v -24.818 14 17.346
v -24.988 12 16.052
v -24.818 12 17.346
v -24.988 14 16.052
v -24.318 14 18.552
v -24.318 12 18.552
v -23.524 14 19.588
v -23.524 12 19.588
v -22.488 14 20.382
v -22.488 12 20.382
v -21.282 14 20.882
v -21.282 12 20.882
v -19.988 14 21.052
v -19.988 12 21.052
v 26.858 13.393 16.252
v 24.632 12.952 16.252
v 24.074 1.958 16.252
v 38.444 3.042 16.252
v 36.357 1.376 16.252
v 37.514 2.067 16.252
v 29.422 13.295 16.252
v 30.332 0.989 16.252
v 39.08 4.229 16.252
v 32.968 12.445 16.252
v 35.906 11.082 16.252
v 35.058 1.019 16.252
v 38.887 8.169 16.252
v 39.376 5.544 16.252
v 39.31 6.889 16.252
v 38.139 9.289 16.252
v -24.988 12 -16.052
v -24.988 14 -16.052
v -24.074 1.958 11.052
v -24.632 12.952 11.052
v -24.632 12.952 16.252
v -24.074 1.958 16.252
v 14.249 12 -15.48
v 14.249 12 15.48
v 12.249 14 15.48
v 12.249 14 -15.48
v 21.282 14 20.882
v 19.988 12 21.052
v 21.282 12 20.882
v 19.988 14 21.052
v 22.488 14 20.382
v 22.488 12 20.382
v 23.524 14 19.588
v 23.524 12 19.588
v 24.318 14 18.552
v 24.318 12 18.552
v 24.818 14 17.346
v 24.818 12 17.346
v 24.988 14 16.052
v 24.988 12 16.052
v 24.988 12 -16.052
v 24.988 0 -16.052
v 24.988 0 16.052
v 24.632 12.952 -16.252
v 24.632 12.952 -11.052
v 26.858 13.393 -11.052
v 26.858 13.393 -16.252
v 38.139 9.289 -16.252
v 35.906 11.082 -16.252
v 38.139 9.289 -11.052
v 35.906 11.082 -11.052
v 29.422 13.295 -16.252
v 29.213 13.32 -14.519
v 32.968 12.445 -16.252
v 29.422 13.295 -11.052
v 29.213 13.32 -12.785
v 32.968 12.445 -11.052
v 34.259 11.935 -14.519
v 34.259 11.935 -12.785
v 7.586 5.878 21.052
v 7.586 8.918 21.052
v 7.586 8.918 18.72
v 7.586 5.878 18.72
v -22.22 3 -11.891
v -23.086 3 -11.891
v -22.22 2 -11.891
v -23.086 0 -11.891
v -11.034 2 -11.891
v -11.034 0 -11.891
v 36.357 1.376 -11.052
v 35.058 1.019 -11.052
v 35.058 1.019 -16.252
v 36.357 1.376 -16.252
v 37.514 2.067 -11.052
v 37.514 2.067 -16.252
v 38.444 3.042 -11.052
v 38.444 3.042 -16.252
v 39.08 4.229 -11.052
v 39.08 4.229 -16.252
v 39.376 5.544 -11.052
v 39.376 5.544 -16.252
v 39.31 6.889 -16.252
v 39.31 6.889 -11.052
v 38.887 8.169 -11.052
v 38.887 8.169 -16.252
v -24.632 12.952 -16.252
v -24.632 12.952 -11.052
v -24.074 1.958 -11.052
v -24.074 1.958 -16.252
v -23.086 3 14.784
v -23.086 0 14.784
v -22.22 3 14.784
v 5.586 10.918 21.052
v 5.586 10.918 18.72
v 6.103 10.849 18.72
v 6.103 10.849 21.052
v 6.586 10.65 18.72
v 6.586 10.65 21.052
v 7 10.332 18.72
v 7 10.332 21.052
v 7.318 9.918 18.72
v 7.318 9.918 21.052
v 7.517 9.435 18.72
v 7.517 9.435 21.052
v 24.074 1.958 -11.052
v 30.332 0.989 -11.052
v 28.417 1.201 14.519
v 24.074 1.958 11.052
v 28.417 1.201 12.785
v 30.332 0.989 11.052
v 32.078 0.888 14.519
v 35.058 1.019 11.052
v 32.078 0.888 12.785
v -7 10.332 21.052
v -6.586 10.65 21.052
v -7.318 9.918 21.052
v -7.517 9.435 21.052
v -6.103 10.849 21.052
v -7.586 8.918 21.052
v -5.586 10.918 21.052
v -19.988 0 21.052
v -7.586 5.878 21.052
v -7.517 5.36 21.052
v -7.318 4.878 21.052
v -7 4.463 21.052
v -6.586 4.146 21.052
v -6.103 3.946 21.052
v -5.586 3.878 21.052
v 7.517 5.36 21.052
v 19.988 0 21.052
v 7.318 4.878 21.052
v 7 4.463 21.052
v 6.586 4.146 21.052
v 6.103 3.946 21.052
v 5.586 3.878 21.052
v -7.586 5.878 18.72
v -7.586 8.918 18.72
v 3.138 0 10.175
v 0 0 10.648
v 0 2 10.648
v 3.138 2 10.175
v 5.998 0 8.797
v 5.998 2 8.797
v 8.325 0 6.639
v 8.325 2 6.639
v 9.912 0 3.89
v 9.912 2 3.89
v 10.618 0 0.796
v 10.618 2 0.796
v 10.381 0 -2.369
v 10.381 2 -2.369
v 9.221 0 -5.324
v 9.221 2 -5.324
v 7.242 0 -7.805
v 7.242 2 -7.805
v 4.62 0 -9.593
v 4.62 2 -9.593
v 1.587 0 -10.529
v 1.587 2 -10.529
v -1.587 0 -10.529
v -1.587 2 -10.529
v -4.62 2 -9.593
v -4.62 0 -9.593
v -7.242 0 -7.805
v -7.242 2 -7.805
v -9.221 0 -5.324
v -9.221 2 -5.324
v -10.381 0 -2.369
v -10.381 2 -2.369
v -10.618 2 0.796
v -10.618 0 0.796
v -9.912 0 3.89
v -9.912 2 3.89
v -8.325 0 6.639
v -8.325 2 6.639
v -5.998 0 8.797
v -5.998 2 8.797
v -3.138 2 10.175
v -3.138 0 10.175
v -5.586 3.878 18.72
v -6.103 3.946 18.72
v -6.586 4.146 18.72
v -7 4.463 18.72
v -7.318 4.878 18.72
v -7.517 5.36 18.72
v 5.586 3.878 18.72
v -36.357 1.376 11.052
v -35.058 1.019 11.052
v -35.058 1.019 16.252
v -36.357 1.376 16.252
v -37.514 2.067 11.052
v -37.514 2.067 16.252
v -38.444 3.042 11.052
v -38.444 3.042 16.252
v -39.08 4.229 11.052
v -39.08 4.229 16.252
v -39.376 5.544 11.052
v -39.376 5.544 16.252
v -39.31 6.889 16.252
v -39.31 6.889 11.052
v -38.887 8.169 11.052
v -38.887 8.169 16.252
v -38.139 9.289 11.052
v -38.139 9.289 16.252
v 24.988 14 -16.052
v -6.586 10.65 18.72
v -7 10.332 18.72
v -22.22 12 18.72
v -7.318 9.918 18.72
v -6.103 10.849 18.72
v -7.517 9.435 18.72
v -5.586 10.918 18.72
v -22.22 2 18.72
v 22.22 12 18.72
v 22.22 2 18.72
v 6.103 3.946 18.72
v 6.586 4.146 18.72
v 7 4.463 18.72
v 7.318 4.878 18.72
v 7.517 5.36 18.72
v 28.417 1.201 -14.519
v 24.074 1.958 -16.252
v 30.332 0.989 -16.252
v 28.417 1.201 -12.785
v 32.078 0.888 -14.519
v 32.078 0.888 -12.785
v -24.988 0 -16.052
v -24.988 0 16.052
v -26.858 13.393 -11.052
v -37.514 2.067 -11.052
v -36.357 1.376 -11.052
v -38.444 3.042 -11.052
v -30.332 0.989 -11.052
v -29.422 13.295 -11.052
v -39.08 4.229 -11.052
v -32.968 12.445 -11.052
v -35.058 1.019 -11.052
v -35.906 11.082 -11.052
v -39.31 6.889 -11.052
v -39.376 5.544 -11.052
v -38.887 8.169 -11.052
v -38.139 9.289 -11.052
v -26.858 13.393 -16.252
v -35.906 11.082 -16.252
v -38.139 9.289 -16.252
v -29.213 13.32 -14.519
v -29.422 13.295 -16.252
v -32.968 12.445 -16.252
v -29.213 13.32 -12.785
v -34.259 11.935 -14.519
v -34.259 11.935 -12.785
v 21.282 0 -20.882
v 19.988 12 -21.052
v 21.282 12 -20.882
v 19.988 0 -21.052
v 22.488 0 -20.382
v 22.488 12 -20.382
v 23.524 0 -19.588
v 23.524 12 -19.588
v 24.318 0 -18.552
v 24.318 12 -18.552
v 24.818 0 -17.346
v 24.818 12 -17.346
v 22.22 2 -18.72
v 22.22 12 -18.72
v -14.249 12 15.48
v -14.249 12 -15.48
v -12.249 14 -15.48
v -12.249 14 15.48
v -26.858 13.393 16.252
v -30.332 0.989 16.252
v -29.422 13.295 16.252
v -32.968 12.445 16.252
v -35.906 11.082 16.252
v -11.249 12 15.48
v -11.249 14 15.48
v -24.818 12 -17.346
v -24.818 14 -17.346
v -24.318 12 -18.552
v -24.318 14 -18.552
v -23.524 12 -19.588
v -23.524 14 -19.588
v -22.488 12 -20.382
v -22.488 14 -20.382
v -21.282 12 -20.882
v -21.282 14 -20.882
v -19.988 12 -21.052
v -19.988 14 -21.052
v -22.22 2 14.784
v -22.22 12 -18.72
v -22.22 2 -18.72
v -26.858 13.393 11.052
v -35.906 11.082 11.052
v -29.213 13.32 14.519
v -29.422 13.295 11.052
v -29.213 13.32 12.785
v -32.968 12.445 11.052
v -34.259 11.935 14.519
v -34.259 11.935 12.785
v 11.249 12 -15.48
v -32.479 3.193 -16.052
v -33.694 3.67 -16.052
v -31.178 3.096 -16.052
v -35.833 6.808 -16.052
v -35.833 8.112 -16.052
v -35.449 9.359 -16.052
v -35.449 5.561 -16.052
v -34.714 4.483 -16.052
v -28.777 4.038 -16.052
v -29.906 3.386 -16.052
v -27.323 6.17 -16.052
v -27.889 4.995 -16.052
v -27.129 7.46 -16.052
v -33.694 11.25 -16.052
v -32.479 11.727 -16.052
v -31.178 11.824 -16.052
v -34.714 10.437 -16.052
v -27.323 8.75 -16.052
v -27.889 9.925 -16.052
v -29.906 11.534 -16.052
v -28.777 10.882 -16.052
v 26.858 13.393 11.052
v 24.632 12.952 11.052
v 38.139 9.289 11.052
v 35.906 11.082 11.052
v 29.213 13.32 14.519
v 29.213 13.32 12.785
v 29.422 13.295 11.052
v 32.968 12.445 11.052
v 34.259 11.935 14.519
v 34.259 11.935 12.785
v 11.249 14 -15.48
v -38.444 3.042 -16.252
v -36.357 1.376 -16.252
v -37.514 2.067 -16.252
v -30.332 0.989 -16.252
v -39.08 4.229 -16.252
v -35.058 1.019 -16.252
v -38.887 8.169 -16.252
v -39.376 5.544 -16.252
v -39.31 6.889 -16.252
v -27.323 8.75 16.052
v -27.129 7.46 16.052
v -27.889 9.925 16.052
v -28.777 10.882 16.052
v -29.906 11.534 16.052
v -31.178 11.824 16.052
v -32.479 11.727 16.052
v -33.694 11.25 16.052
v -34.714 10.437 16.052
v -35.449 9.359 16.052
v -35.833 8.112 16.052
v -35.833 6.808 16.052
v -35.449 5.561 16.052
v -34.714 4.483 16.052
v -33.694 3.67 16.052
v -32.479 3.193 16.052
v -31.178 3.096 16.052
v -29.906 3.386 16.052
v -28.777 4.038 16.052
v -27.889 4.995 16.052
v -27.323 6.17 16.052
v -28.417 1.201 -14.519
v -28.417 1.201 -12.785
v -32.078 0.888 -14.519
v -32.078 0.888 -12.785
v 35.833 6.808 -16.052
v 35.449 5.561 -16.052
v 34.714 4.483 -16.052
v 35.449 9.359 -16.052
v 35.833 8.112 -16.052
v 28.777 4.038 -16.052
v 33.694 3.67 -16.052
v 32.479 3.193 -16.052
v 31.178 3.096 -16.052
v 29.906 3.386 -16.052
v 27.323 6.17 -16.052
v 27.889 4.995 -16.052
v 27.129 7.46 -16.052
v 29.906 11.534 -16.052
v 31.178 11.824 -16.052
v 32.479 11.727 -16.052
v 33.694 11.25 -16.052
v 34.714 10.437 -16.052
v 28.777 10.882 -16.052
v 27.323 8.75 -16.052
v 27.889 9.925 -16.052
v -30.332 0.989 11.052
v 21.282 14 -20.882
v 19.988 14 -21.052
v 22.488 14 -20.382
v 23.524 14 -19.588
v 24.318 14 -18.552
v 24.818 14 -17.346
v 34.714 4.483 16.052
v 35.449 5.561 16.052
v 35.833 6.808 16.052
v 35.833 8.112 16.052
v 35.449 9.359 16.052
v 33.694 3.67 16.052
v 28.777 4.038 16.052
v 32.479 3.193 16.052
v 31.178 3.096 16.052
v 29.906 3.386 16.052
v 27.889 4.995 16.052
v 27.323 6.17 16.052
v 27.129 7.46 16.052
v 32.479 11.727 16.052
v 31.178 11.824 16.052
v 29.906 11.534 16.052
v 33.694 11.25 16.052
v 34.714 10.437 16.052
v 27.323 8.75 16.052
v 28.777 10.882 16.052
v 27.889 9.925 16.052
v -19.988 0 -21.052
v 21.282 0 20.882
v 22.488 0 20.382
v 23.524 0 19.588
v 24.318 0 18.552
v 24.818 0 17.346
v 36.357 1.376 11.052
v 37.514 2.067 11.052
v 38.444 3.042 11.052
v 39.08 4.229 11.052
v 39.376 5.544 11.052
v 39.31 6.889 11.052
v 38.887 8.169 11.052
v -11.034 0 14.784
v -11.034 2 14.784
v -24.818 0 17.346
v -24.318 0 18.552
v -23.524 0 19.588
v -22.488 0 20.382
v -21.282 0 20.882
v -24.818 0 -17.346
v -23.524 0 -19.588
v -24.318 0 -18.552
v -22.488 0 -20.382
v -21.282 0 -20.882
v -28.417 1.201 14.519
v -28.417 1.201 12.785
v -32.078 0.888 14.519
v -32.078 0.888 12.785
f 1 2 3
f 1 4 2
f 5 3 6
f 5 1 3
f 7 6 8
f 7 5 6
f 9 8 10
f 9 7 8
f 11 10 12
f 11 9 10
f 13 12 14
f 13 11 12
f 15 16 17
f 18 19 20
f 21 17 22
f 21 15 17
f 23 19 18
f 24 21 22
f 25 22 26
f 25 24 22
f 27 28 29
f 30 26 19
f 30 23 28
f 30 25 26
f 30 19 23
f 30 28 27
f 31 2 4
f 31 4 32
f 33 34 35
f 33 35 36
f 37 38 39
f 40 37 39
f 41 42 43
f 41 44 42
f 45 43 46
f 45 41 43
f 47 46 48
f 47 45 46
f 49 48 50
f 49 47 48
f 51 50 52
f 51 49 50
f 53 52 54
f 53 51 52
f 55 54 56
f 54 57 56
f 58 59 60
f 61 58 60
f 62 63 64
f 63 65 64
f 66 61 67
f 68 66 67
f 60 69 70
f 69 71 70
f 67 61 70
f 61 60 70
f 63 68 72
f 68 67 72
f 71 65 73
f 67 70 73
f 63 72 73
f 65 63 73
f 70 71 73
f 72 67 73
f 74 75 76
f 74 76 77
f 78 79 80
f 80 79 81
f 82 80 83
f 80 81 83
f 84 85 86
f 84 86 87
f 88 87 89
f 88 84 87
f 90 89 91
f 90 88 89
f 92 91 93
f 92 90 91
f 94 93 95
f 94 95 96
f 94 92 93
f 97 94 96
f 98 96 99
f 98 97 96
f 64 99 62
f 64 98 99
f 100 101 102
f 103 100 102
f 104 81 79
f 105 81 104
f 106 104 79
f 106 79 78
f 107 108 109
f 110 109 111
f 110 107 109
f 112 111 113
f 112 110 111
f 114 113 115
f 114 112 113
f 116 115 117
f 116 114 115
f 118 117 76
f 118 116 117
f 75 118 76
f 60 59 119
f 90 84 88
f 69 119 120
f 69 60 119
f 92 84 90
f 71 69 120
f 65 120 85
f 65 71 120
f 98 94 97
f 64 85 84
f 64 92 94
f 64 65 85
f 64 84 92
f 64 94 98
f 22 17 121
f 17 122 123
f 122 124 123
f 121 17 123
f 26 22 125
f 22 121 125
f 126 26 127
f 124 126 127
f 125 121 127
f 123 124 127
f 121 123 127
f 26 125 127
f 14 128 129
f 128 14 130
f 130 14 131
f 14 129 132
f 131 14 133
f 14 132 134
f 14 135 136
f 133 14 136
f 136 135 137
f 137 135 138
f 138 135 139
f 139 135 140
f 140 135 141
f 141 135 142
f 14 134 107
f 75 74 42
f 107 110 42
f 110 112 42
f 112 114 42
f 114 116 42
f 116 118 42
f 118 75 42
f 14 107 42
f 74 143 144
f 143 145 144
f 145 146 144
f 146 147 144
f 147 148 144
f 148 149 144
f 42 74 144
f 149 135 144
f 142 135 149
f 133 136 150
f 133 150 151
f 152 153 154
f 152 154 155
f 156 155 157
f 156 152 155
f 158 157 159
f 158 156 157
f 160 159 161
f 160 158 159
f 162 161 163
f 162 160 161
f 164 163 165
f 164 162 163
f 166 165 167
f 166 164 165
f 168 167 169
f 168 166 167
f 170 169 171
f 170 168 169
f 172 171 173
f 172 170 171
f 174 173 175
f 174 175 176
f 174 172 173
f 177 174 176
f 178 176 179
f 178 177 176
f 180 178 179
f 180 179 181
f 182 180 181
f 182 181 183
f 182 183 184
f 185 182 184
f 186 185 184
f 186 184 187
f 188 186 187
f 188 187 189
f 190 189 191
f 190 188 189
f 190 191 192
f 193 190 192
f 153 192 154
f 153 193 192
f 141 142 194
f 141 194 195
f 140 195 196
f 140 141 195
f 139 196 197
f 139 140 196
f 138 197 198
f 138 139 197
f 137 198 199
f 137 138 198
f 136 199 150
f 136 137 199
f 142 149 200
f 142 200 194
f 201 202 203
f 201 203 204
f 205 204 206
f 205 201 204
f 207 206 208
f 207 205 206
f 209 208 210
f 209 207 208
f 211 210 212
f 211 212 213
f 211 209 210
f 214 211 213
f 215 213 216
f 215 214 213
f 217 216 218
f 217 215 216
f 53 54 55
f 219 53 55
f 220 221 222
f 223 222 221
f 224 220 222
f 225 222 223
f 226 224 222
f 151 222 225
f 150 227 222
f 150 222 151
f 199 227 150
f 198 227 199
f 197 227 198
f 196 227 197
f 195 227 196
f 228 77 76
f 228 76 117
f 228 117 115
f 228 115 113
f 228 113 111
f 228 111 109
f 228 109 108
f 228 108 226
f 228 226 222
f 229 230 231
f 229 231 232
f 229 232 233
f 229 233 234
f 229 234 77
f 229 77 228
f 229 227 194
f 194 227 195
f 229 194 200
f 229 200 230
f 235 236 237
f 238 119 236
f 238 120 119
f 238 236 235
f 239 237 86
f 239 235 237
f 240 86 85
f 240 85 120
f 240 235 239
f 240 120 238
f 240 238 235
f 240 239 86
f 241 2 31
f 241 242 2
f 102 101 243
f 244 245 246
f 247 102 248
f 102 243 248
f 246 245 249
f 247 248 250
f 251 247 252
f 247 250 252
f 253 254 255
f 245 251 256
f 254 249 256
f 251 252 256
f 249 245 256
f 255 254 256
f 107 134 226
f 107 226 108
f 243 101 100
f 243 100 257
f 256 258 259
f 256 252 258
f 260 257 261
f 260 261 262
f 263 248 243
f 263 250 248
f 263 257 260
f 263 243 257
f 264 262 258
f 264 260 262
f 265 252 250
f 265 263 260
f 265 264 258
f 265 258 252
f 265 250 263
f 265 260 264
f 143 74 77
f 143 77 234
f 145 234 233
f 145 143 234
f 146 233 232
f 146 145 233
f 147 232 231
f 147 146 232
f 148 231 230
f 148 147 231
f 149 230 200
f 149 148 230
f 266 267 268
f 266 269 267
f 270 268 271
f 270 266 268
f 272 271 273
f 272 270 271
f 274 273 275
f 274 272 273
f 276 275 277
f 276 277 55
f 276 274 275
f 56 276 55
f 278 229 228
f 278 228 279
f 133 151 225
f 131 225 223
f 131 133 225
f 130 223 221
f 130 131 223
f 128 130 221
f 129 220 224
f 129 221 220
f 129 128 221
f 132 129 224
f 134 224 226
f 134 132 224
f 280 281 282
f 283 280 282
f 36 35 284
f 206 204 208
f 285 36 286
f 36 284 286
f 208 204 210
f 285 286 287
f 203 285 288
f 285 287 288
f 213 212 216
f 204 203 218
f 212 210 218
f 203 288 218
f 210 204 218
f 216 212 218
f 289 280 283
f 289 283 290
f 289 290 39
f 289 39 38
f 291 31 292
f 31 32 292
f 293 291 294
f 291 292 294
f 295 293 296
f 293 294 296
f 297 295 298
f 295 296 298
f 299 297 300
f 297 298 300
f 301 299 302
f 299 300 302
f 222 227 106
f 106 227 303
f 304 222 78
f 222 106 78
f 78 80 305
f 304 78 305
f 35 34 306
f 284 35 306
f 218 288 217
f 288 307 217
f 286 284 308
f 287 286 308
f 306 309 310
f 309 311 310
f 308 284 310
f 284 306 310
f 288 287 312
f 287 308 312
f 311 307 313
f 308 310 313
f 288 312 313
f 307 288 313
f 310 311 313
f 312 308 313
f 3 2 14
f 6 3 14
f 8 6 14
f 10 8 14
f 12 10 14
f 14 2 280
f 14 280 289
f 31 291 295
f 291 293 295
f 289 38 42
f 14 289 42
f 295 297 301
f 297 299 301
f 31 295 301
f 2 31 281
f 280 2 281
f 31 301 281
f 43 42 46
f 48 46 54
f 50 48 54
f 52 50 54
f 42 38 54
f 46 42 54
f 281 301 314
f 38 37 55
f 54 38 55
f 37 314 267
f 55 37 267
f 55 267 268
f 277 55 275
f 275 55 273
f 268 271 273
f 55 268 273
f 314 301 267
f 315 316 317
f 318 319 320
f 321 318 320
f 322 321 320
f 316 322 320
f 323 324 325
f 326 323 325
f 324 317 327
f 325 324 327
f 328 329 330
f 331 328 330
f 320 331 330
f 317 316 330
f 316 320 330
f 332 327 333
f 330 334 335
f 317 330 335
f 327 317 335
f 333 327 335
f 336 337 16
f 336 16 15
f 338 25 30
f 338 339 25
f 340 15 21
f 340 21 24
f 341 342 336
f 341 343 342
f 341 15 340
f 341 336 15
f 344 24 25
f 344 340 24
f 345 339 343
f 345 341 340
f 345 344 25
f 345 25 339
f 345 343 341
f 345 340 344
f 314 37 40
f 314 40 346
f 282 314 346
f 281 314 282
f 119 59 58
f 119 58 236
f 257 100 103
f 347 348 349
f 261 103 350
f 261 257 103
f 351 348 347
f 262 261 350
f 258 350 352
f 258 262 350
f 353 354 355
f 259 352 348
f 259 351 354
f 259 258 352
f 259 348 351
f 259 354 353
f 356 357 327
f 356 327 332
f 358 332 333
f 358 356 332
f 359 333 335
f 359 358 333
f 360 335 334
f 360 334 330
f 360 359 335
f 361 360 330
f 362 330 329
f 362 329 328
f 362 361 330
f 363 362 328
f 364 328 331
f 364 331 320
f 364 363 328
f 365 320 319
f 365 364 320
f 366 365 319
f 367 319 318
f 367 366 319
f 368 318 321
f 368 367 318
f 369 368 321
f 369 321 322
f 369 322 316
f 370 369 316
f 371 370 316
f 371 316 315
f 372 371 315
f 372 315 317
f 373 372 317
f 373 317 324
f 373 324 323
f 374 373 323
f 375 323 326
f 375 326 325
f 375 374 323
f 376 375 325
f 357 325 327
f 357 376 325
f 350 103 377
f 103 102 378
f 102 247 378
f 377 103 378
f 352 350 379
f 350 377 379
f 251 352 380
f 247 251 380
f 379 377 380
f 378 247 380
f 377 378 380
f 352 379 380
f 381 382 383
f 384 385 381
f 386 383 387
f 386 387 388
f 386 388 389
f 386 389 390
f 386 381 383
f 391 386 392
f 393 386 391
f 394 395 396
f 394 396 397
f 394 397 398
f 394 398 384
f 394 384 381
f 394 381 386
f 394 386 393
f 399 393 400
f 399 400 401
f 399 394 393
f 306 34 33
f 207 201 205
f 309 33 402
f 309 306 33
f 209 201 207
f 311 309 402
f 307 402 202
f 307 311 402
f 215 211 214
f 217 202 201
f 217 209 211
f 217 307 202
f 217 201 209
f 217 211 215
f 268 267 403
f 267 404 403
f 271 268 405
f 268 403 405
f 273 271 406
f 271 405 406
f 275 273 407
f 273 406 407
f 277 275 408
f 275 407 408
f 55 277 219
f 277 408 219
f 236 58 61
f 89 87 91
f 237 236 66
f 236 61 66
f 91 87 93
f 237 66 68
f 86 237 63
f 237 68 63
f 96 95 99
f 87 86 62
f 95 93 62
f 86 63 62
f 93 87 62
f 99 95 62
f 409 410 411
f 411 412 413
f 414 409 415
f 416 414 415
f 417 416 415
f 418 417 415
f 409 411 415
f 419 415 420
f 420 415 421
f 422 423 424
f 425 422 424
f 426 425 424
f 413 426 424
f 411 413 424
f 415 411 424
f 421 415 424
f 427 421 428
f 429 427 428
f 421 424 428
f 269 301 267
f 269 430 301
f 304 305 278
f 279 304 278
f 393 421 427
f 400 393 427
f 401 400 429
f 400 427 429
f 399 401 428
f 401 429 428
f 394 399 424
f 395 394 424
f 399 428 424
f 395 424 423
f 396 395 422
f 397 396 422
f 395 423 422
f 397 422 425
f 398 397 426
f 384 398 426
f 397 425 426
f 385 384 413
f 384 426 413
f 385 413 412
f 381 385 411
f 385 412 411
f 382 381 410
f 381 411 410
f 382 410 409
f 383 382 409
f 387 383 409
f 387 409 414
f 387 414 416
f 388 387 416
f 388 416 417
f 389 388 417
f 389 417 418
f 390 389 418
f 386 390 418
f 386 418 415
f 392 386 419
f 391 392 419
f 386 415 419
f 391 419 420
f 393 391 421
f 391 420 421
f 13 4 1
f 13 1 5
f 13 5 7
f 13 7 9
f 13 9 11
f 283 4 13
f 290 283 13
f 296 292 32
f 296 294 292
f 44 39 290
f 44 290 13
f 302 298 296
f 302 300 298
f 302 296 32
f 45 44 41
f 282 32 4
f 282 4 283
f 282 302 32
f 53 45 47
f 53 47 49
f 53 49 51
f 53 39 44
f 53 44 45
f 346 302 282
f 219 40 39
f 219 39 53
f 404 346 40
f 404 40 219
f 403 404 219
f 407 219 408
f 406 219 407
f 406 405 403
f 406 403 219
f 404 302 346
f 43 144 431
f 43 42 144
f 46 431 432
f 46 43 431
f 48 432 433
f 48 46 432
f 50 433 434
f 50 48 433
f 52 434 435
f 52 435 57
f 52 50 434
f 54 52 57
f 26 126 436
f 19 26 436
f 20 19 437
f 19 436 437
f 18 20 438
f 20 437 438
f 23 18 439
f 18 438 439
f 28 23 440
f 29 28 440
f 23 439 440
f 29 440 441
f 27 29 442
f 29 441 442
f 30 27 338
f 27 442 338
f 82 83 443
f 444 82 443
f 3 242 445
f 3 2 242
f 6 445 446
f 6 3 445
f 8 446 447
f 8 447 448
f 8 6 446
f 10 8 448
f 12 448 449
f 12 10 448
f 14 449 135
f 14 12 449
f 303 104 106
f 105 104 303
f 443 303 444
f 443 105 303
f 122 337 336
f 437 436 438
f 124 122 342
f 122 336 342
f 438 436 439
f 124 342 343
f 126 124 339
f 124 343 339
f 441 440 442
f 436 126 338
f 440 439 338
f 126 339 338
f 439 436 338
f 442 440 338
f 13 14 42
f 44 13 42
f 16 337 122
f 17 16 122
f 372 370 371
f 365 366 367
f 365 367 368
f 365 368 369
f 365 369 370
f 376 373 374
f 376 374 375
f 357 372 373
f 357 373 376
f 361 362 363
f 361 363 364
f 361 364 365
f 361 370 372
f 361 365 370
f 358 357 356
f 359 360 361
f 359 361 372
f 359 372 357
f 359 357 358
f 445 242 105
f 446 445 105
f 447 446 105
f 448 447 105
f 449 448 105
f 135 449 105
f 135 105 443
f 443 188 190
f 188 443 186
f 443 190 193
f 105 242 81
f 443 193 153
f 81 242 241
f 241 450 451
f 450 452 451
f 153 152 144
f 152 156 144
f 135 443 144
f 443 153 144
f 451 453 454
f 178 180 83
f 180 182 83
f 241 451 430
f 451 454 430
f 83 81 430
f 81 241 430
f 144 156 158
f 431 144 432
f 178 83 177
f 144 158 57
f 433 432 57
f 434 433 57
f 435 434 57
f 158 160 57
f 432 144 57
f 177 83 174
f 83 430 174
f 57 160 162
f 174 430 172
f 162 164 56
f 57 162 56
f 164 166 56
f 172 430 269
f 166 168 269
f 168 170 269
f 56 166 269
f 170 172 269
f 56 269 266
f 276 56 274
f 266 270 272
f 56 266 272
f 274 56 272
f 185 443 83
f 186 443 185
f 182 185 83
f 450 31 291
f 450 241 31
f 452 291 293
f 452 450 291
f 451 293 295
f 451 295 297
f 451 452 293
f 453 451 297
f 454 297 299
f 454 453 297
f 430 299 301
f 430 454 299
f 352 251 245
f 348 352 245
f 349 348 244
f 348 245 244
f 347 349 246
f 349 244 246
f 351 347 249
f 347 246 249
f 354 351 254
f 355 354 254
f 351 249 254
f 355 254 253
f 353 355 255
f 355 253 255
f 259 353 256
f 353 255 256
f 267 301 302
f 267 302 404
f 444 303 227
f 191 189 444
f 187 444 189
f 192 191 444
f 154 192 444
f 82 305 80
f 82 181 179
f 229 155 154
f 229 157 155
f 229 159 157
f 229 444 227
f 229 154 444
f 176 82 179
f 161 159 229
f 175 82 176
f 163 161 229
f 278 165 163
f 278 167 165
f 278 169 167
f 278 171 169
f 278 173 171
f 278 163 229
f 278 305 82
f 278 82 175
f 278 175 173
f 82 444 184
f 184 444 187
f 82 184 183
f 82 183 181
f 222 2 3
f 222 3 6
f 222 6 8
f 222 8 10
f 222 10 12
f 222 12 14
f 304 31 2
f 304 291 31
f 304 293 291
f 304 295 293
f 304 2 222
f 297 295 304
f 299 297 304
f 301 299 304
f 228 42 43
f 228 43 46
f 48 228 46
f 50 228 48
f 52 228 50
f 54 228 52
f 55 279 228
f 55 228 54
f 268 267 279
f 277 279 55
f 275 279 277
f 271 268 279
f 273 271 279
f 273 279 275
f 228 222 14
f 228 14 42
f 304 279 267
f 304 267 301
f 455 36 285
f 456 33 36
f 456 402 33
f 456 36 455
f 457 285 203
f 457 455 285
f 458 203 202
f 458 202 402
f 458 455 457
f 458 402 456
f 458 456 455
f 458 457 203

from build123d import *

# Parameters (mm, degrees)
SKETCH1_W                = 49.976384144
SKETCH1_H                = 42.104287242
SKETCH1_R                = 10.647598488
BOSS_EXTRUDE2_DEPTH      = 2
SKETCH2_W                = 49.976384144
SKETCH2_H                = 42.104287242
SKETCH2_W_2              = 44.439076198
SKETCH2_H_2              = 37.439195754
BOSS_EXTRUDE3_DEPTH      = 10
CUT_EXTRUDE1_DEPTH       = 10
SKETCH4_W                = 49.976384144
SKETCH4_H                = 42.104287242
BOSS_EXTRUDE4_DEPTH      = 2
SKETCH5_W                = 22.497186092
SKETCH5_H                = 30.96041324
CUT_EXTRUDE2_DEPTH       = 3
SKETCH6_W                = 12.052063978
SKETCH6_H                = 26.675234937
CUT_EXTRUDE3_DEPTH       = 3
FILLET3_R                = 5
FILLET4_R                = 5
FILLET5_R                = 5
FILLET6_R                = 5
CHAMFER1_SIZE            = 3
BOSS_EXTRUDE5_DEPTH      = 16.052144
BOSS_EXTRUDE5_DEPTH_BACK = 16.052144
SKETCH7_R                = 4.376614107
BOSS_EXTRUDE7_DEPTH      = 0.2
BOSS_EXTRUDE7_DEPTH_BACK = 5


with BuildPart() as part:
    # Sketch1 → Boss-Extrude2 (new body)
    with BuildSketch(Plane(origin=(0, 0, 0), x_dir=(1, 0, 0), z_dir=(0, 1, 0))):
        Rectangle(SKETCH1_W, SKETCH1_H)
        with Locations(Location((0, 0, 0), (0, 0, 270))):
            Circle(SKETCH1_R, mode=Mode.SUBTRACT)
    extrude(amount=BOSS_EXTRUDE2_DEPTH)

    # Sketch2 → Boss-Extrude3 (add)
    with BuildSketch(Plane(origin=(0, 2, 0), x_dir=(1, 0, 0), z_dir=(0, 1, 0))):
        Rectangle(SKETCH2_W, SKETCH2_H)
        Rectangle(SKETCH2_W_2, SKETCH2_H_2, mode=Mode.SUBTRACT)
    extrude(amount=BOSS_EXTRUDE3_DEPTH)

    # Sketch3 → Cut-Extrude1 (cut)
    with BuildSketch(Plane.XY.offset(21.052143621)):
        with BuildLine():
            Line((-7.585558373, 5.87765836), (-7.585558373, 8.917504734))
            ThreePointArc((-7.585558373, 8.917504734), (-6.999771935, 10.331718297), (-5.585558373, 10.917504734))
            Line((-5.585558373, 10.917504734), (5.585558373, 10.917504734))
            ThreePointArc((5.585558373, 10.917504734), (6.999771935, 10.331718297), (7.585558373, 8.917504734))
            Line((7.585558373, 8.917504734), (7.585558373, 5.87765836))
            ThreePointArc((7.585558373, 5.87765836), (6.999771935, 4.463444798), (5.585558373, 3.87765836))
            Line((5.585558373, 3.87765836), (-5.585558373, 3.87765836))
            ThreePointArc((-5.585558373, 3.87765836), (-6.999771935, 4.463444798), (-7.585558373, 5.87765836))
        make_face()
    extrude(amount=-CUT_EXTRUDE1_DEPTH, mode=Mode.SUBTRACT)

    # Sketch6 → Cut-Extrude3 (cut)
    with BuildSketch(Plane.XZ):
        with Locations((-17.06036612, 1.446247677)):
            Rectangle(SKETCH6_W, SKETCH6_H)
    extrude(amount=-CUT_EXTRUDE3_DEPTH, mode=Mode.SUBTRACT)

    # Fillet3
    fillet3_edges = [part.edges().sort_by_distance(p)[0] for p in [
        (-24.988192072, 6, 21.052143621),
    ]]
    fillet(fillet3_edges, radius=FILLET3_R)

    # Fillet5
    fillet5_edges = [part.edges().sort_by_distance(p)[0] for p in [
        (-24.988192072, 6, -21.052143621),
        (24.988192072, 6, 21.052143621),
        (24.988192072, 6, -21.052143621),
    ]]
    fillet(fillet5_edges, radius=FILLET5_R)


with BuildPart() as body_2:
    # Sketch4 → Boss-Extrude4 (new body)
    with BuildSketch(Plane(origin=(0, 12, 0), x_dir=(1, 0, 0), z_dir=(0, 1, 0))):
        Rectangle(SKETCH4_W, SKETCH4_H)
    extrude(amount=BOSS_EXTRUDE4_DEPTH)

    # Sketch5 → Cut-Extrude2 (cut)
    with BuildSketch(Plane(origin=(0, 14, 0), x_dir=(1, 0, 0), z_dir=(0, 1, 0))):
        Rectangle(SKETCH5_W, SKETCH5_H)
    extrude(amount=-CUT_EXTRUDE2_DEPTH, mode=Mode.SUBTRACT)

    # Fillet4
    fillet4_edges = [body_2.edges().sort_by_distance(p)[0] for p in [
        (-24.988192072, 13, 21.052143621),
        (-24.988192072, 13, -21.052143621),
    ]]
    fillet(fillet4_edges, radius=FILLET4_R)

    # Fillet6
    fillet6_edges = [body_2.edges().sort_by_distance(p)[0] for p in [
        (24.988192072, 13, 21.052143621),
        (24.988192072, 13, -21.052143621),
    ]]
    fillet(fillet6_edges, radius=FILLET6_R)

    # Chamfer1
    # the kernel refuses this chamfer: 3 mm, written as the material it takes off along each edge
    with BuildSketch(Plane(origin=(-11.248593046, 12, -15.48020662), x_dir=(-0.9996219169112969, -0.02749587661058621, 0), z_dir=(0, 0, 1)), Plane(origin=(11.248593046, 12, 15.48020662), x_dir=(0.9996219169112969, -0.02749587661058621, 0), z_dir=(0, 0, -1))) as chamfer1_piece_1:
        Polygon((CHAMFER1_SIZE * 0.999621916911, -CHAMFER1_SIZE * 0.0274958766106), (-CHAMFER1_SIZE * 0.0274958766106, -CHAMFER1_SIZE * 0.999621916911), (0, 0), align=None)
    extrude(amount=30.960413241, mode=Mode.SUBTRACT)


with BuildPart() as body_3:
    # Sketch7 → Boss-Extrude5 (new, two sides: drawn at the far end of the back side and taken through both)
    with BuildSketch(Plane(origin=(0, 0, 0), x_dir=(-1, 0, 0), z_dir=(0, 0, -1)).offset(-BOSS_EXTRUDE5_DEPTH_BACK)):
        with Locations((-31.505407588, 7.46002795)):
            Circle(SKETCH7_R)
    extrude(amount=BOSS_EXTRUDE5_DEPTH + BOSS_EXTRUDE5_DEPTH_BACK)


with BuildPart() as body_4:
    # Mirror1: mirrored copy
    add(body_3.part.mirror(Plane(origin=(0, 0, 0), x_dir=(0, 0, 1), z_dir=(1, 0, 0))))


with BuildPart() as body_5:
    # Sketch8 → Boss-Extrude7 (new, two sides: drawn at the far end of the back side and taken through both)
    with BuildSketch(Plane(origin=(0, 0, -16.052143621), x_dir=(-1, 0, 0), z_dir=(0, 0, -1)).offset(-BOSS_EXTRUDE7_DEPTH_BACK)):
        with BuildLine():
            Line((-24.632270624, 12.951501751), (-24.073830772, 1.958385001))
            add(Edge.make_bspline(
                [(-24.073830772, 1.958385001), (-28.757214086, 0.978704203), (-32.41859253, 0.665498797), (-35.057966104, 1.018768784)],
                knots=[0, 0, 0, 0, 0.375825094, 0.375825094, 0.375825094, 0.375825094], degree=3))
            ThreePointArc((-35.057966104, 1.018768784), (-39.080137155, 4.229233655), (-38.138514088, 9.288708989))
            add(Edge.make_bspline(
                [(-24.632270624, 12.951501751), (-28.43707339, 14.362948841), (-35.384738996, 12.399554019), (-38.138514088, 9.288708989)],
                knots=[0, 0, 0, 0, 0.766664449, 0.766664449, 0.766664449, 0.766664449], degree=3))
        make_face()
    extrude(amount=BOSS_EXTRUDE7_DEPTH + BOSS_EXTRUDE7_DEPTH_BACK)


with BuildPart() as body_6:
    # Mirror3: mirrored copy
    add(body_5.part.mirror(Plane(origin=(0, 0, 0), x_dir=(1, 0, 0), z_dir=(0, 0, -1))))


with BuildPart() as body_7:
    # Mirror4: mirrored copy
    add(body_5.part.mirror(Plane(origin=(0, 0, 0), x_dir=(0, 0, 1), z_dir=(1, 0, 0))))


with BuildPart() as body_8:
    # Mirror4 2: mirrored copy
    add(body_6.part.mirror(Plane(origin=(0, 0, 0), x_dir=(0, 0, 1), z_dir=(1, 0, 0))))


solid = Compound([part.part, body_2.part, body_3.part, body_4.part, body_5.part, body_6.part, body_7.part, body_8.part])
